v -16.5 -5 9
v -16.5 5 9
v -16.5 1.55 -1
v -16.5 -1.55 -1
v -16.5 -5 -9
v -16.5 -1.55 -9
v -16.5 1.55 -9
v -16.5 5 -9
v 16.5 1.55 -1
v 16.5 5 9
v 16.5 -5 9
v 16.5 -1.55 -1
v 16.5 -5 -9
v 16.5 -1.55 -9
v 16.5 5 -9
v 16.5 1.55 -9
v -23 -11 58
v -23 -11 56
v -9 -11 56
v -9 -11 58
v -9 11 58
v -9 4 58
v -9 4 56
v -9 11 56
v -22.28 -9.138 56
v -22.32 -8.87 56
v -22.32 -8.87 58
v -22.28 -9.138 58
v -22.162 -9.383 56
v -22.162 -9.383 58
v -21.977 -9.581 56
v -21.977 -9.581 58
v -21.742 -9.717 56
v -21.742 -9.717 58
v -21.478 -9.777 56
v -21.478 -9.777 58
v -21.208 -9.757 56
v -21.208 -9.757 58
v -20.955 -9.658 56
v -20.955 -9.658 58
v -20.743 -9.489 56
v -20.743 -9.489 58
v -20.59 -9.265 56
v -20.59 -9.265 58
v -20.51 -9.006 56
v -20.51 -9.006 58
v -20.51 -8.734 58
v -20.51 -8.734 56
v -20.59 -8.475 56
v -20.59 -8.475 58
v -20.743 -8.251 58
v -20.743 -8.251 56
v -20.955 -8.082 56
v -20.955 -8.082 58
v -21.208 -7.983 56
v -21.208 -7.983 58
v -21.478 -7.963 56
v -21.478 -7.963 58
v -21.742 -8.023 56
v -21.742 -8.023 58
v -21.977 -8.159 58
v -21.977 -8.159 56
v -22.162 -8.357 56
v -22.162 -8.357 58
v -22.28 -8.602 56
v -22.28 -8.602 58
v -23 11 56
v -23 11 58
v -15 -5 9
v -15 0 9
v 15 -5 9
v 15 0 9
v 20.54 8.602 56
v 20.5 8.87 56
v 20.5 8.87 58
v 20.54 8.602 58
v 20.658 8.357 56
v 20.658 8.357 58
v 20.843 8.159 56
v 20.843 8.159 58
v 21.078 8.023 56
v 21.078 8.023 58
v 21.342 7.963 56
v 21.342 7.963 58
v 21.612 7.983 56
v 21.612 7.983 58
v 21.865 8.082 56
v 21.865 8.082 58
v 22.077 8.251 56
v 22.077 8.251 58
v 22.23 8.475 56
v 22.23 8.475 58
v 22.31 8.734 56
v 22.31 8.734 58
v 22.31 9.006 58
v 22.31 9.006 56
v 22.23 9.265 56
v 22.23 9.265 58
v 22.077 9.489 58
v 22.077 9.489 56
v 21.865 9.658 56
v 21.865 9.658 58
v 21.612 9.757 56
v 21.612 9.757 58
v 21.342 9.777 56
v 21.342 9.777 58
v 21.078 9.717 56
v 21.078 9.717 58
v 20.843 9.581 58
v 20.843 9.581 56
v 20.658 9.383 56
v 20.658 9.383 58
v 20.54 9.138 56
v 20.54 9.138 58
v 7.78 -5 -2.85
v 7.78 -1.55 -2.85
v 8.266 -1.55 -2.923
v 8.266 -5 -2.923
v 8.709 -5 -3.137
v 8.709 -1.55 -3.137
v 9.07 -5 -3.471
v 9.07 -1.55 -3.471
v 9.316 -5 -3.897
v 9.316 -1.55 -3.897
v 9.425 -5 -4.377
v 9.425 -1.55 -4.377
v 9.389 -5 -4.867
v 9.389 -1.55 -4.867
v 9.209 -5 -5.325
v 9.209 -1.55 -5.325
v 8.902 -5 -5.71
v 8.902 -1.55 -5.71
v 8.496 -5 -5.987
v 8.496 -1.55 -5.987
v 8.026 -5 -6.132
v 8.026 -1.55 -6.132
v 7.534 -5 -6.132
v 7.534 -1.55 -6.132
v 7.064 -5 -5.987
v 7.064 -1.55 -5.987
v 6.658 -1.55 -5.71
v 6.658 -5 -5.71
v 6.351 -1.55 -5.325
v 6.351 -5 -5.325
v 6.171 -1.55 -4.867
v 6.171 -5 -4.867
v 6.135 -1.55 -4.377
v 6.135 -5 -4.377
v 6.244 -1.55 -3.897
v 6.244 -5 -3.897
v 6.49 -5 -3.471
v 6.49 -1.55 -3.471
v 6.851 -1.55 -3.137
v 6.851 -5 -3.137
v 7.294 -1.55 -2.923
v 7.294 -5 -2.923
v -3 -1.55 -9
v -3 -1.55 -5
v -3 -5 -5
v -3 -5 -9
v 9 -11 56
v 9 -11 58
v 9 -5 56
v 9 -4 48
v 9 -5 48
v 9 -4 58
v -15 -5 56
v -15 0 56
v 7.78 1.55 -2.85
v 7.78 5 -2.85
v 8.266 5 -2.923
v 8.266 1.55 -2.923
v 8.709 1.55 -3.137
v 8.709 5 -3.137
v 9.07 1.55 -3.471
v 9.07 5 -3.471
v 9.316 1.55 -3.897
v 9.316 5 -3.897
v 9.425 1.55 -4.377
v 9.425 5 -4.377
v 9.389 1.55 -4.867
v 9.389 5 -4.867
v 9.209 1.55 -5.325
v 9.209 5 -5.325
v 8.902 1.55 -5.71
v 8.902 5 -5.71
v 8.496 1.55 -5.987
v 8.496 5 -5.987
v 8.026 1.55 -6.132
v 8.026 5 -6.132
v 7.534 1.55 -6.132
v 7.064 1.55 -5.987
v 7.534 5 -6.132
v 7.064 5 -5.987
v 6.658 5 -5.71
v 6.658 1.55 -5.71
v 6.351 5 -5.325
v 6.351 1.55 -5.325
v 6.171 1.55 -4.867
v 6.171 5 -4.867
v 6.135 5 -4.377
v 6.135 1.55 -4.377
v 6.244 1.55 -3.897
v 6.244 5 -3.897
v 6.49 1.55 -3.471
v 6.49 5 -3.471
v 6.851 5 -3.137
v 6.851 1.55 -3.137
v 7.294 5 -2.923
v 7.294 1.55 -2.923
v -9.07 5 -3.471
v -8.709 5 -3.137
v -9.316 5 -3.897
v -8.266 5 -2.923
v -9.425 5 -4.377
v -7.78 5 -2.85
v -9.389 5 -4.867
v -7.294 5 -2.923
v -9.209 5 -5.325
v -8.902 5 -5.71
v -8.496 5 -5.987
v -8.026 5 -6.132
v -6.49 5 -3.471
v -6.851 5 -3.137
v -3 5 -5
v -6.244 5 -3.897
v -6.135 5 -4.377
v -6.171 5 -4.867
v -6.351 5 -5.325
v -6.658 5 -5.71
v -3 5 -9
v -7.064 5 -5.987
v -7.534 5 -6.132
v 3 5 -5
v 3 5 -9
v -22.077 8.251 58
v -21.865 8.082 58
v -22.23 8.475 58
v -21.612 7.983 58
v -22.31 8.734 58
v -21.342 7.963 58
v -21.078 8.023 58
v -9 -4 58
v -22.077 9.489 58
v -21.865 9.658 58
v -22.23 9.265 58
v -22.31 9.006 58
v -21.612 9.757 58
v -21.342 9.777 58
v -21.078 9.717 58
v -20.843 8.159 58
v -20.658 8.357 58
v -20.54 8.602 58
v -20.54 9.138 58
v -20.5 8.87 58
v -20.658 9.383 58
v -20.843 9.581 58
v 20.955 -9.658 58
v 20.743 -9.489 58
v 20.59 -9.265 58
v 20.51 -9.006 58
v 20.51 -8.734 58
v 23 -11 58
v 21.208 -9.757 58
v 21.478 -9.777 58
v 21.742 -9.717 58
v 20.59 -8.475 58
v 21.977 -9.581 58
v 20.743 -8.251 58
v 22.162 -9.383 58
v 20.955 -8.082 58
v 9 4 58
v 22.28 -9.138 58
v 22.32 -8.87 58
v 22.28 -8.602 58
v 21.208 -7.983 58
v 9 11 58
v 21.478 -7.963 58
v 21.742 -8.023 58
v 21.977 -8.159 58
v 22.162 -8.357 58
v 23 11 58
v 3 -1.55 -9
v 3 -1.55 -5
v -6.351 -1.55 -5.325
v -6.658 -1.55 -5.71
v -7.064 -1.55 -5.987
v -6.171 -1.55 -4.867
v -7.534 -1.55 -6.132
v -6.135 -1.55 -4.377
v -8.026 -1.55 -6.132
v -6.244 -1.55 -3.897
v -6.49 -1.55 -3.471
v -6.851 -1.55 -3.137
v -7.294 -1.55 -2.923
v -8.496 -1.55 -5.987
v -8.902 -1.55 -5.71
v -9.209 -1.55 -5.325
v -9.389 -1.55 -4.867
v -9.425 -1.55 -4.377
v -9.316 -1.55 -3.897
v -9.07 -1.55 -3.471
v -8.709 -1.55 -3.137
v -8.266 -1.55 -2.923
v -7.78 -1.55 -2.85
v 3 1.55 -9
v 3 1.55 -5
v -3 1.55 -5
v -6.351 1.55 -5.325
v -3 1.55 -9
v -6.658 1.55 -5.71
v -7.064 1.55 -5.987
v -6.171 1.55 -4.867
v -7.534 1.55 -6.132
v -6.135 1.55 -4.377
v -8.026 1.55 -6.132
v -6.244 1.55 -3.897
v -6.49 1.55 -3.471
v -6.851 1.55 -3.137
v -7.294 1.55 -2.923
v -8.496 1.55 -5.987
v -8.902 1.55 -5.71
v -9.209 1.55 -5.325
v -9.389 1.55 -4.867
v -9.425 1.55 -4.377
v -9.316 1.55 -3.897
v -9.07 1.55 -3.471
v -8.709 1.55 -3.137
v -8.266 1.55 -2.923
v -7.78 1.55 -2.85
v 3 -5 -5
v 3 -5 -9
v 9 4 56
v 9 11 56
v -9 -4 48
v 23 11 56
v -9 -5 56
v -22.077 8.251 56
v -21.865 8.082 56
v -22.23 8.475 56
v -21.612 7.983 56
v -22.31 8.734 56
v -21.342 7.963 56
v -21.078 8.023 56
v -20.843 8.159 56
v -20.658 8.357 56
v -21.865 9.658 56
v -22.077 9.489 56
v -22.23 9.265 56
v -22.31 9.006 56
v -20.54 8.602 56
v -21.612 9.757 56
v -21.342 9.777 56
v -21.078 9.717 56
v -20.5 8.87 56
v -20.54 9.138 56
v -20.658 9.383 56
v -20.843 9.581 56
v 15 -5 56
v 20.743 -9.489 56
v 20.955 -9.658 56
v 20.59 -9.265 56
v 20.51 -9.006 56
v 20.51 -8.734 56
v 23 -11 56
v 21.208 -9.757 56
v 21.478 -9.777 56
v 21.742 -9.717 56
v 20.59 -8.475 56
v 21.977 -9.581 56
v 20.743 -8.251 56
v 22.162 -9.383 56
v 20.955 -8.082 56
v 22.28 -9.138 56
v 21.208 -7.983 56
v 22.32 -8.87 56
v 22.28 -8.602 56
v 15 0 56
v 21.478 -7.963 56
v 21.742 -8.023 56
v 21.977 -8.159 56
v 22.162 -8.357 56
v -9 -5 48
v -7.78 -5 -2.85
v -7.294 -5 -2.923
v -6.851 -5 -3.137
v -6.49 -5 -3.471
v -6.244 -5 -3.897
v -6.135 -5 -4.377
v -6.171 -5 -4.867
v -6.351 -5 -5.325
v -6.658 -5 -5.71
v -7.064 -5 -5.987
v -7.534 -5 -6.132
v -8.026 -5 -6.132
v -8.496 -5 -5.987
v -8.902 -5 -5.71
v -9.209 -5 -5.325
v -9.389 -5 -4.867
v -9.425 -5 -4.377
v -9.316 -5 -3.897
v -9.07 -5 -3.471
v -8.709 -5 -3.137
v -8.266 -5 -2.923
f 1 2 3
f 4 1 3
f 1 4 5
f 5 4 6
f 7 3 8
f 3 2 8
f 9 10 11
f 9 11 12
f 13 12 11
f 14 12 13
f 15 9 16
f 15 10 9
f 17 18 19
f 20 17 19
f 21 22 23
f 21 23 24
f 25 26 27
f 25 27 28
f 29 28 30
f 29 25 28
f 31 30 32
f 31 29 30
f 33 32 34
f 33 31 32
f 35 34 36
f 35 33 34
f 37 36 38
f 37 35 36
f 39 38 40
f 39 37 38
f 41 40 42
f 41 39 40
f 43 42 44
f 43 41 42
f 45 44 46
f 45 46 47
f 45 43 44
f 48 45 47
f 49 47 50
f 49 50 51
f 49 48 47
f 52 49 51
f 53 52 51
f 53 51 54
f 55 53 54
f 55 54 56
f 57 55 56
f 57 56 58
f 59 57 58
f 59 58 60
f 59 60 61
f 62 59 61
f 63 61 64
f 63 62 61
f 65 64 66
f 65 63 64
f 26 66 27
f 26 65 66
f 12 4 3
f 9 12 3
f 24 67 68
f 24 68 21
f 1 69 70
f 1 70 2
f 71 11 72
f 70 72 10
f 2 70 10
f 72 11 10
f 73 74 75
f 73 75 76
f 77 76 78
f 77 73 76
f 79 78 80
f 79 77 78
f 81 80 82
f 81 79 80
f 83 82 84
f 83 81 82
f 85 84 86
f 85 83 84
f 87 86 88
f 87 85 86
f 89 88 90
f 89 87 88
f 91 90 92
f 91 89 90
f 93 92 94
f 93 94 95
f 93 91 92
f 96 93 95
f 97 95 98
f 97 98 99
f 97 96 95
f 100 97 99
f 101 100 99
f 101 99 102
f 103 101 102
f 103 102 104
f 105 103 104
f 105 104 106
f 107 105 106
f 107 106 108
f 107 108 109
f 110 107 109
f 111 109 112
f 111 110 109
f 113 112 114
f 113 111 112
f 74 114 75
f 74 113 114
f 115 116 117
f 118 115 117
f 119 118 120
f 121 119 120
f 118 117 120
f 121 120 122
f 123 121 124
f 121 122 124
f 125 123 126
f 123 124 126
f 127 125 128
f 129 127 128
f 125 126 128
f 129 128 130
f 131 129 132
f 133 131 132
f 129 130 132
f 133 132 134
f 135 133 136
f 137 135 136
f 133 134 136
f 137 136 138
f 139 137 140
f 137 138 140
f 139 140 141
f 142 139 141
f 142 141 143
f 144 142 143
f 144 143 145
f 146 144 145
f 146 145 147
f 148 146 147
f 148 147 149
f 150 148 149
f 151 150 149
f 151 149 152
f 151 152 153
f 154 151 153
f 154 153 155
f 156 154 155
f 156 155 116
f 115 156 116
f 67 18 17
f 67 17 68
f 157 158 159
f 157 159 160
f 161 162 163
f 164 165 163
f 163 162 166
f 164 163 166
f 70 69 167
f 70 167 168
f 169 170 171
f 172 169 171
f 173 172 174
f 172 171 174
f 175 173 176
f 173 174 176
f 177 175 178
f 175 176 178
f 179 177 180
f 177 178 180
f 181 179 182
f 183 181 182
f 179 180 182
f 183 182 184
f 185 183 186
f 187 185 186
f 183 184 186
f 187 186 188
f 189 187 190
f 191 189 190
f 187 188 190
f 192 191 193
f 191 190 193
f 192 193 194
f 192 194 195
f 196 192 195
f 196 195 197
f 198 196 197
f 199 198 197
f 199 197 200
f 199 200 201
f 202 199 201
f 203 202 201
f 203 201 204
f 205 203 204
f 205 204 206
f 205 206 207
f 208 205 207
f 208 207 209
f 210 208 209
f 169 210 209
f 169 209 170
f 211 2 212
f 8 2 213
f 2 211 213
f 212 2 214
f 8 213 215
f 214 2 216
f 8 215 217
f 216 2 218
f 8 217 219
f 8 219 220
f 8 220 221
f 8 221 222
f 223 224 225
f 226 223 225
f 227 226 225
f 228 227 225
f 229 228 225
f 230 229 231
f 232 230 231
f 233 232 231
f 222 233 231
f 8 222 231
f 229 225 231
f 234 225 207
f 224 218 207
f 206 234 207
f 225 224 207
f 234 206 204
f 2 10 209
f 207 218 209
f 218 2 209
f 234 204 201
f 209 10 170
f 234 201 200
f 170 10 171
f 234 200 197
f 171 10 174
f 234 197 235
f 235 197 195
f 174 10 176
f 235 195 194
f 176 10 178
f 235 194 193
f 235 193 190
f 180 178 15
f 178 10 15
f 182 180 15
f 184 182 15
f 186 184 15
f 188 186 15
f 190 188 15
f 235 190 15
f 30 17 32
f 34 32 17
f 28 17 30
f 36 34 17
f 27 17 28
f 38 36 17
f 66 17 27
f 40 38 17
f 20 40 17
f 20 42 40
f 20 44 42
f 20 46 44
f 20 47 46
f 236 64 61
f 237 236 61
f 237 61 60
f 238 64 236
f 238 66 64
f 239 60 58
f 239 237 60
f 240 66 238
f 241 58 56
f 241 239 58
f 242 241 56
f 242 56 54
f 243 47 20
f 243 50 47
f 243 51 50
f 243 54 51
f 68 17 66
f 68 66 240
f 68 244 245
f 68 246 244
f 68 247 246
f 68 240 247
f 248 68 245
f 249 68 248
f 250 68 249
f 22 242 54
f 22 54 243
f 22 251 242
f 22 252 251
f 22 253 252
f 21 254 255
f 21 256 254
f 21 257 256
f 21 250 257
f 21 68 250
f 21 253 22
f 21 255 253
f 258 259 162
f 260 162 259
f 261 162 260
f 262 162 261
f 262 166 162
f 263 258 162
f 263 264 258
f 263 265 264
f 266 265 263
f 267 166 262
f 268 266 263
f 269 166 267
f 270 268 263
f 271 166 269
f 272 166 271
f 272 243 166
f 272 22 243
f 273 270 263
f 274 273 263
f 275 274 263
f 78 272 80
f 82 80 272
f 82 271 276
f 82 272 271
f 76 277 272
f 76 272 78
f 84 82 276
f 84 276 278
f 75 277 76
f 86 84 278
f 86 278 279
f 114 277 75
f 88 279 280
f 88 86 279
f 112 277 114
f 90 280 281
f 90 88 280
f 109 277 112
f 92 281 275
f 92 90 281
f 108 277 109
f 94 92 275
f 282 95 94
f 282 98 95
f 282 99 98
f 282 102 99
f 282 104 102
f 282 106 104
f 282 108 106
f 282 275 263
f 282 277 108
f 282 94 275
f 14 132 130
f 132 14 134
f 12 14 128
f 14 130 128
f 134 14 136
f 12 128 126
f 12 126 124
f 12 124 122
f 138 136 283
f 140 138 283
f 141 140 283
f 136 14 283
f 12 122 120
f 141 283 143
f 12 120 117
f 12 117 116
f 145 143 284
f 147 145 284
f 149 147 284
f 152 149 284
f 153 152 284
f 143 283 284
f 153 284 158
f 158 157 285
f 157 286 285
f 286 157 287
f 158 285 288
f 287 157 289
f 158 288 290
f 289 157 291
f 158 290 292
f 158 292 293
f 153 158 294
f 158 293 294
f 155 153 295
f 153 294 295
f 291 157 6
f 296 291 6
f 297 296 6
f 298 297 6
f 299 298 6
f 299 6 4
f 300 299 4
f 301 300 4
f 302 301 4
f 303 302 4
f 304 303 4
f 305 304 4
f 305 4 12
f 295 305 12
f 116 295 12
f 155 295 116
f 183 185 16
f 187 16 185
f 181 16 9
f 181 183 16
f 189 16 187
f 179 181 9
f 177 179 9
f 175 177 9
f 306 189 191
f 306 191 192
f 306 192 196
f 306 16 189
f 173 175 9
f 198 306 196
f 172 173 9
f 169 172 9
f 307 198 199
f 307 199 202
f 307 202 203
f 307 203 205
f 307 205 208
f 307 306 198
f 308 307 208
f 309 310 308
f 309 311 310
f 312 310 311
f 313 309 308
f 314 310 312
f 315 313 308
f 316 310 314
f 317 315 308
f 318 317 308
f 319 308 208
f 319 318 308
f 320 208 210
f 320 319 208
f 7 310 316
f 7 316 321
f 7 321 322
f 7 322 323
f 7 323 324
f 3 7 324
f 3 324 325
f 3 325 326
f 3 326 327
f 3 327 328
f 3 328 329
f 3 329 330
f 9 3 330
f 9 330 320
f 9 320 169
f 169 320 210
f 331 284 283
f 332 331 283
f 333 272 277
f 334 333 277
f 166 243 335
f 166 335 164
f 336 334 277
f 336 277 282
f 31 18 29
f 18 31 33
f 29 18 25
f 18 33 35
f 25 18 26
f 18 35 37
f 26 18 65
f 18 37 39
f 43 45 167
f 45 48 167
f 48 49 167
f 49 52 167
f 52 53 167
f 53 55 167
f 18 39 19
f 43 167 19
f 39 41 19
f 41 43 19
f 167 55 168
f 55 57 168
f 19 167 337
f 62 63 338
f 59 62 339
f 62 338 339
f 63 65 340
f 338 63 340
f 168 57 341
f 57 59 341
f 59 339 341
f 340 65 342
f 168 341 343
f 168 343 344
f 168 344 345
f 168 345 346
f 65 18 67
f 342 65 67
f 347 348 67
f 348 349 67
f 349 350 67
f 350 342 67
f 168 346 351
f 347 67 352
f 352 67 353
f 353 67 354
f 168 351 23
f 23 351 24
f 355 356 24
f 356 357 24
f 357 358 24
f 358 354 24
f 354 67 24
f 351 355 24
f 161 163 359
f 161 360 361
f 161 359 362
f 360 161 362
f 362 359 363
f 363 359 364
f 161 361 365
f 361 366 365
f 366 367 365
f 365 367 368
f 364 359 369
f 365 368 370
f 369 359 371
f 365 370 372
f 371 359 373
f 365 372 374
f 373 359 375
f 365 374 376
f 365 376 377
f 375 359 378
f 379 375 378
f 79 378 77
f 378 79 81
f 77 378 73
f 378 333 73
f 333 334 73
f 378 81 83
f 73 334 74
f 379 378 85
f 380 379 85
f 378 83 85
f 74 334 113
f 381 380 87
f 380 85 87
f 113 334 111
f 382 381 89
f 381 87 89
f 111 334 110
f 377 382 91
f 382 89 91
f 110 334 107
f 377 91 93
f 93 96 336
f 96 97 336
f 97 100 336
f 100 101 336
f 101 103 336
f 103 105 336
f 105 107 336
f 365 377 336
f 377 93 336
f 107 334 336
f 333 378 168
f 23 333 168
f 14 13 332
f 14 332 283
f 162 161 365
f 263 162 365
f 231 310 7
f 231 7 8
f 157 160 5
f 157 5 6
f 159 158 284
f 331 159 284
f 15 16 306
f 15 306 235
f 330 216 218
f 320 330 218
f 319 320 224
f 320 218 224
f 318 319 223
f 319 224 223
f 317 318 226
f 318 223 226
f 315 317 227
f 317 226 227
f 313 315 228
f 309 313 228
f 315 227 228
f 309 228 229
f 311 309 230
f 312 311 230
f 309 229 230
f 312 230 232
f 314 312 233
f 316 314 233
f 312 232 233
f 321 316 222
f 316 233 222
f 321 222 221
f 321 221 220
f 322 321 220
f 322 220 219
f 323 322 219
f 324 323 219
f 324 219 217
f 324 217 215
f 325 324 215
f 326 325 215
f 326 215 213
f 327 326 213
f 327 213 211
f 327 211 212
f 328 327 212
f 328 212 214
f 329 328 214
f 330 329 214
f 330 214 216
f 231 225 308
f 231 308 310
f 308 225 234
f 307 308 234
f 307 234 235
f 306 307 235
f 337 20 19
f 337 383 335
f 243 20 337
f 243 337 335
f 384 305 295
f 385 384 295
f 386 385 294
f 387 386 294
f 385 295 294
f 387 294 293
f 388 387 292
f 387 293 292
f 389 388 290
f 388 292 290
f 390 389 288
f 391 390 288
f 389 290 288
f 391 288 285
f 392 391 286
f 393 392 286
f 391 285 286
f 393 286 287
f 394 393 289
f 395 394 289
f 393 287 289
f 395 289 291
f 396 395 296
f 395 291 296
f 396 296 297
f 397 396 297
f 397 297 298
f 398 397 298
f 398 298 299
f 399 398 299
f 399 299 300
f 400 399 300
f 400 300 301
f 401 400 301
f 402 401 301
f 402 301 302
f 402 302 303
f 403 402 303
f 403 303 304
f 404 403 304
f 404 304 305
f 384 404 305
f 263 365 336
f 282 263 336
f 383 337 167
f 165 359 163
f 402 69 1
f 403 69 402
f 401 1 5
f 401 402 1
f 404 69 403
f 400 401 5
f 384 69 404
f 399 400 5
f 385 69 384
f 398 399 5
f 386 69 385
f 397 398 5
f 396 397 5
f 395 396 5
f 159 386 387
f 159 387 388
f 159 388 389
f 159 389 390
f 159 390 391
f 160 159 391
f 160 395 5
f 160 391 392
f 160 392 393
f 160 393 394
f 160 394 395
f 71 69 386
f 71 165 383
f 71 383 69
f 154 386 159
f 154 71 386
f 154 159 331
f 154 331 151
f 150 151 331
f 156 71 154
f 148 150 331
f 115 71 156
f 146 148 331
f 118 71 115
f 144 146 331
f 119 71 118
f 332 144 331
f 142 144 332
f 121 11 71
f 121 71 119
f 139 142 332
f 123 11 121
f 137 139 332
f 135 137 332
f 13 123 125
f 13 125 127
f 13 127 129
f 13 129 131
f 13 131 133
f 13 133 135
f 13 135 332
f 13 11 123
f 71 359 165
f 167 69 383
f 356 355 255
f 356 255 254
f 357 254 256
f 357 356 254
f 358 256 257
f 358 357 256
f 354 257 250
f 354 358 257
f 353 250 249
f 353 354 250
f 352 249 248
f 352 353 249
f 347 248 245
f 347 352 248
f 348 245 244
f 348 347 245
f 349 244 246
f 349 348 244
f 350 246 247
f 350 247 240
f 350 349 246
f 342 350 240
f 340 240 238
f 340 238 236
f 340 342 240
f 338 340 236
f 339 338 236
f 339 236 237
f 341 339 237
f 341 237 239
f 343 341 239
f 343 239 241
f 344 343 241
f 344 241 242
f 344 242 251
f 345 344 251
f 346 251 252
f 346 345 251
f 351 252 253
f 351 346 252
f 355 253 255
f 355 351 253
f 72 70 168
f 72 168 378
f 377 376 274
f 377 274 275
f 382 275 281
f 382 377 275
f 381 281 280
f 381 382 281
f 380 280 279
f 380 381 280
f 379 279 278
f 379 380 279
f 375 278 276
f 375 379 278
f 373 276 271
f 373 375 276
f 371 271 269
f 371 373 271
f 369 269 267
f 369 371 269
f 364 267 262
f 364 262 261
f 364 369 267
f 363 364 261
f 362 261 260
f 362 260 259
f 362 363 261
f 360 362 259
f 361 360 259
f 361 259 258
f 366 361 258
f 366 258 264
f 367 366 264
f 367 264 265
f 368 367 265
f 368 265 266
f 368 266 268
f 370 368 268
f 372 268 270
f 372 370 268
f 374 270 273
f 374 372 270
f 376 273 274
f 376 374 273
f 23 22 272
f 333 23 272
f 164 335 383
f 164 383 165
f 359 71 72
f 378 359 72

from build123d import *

# Parameters (mm, degrees)
SKETCH_1_W          = 18
SKETCH_1_H          = 10
EXTRUDE_1_DEPTH     = 16.5
SKETCH_2_W          = 8
SKETCH_2_H          = 3.1
CUT_EXTRUDE_1_DEPTH = 40
SKETCH_3_R          = 1.65
CUT_EXTRUDE_2_DEPTH = 20
SKETCH_5_W          = 6
SKETCH_5_H          = 8
CUT_EXTRUDE_3_DEPTH = 20
SKETCH_6_W          = 30
SKETCH_6_H          = 5
EXTRUDE_2_DEPTH     = 47
SKETCH_7_W          = 46
SKETCH_7_H          = 22
SKETCH_7_R          = 0.91
EXTRUDE_3_DEPTH     = 2
SKETCH_8_W          = 18
SKETCH_8_H          = 7
CUT_EXTRUDE_4_DEPTH = 10


with BuildPart() as part:
    # 草图1 → 凸台-拉伸1 (new, symmetric)
    with BuildSketch(Plane(origin=(0, 0, 0), x_dir=(0, 0, -1), z_dir=(1, 0, 0))):
        Rectangle(SKETCH_1_W, SKETCH_1_H)
    extrude(amount=EXTRUDE_1_DEPTH, both=True)

    # 草图2 → 切除-拉伸1 (cut)
    with BuildSketch(Plane.ZY.offset(16.5)):
        with Locations((-5, 0)):
            Rectangle(SKETCH_2_W, SKETCH_2_H)
    extrude(amount=-CUT_EXTRUDE_1_DEPTH, mode=Mode.SUBTRACT)

    # 草图3 → 切除-拉伸2 (cut)
    with BuildSketch(Plane(origin=(0, 5, 0), x_dir=(1, 0, 0), z_dir=(0, 1, 0))):
        with Locations(Location((-7.78, 4.5, 0), (0, 0, 270))):
            Circle(SKETCH_3_R)
        with Locations(Location((7.78, 4.5, 0), (0, 0, 270))):
            Circle(SKETCH_3_R)
    extrude(amount=-CUT_EXTRUDE_2_DEPTH, mode=Mode.SUBTRACT)

    # 草图5 → 切除-拉伸3 (cut)
    with BuildSketch(Plane(origin=(0, 5, 0), x_dir=(1, 0, 0), z_dir=(0, 1, 0))):
        with Locations((0, 9)):
            Rectangle(SKETCH_5_W, SKETCH_5_H)
    extrude(amount=-CUT_EXTRUDE_3_DEPTH, mode=Mode.SUBTRACT)

    # 草图6 → 凸台-拉伸2 (add)
    with BuildSketch(Plane.XY.offset(9)):
        with Locations((0, -2.5)):
            Rectangle(SKETCH_6_W, SKETCH_6_H)
    extrude(amount=EXTRUDE_2_DEPTH)

    # 草图7 → 凸台-拉伸3 (add)
    with BuildSketch(Plane.XY.offset(56)):
        Rectangle(SKETCH_7_W, SKETCH_7_H)
        with Locations((-21.41, 8.87)):
            Circle(SKETCH_7_R, mode=Mode.SUBTRACT)
        with Locations(Location((21.41, 8.87, 0), (0, 0, 180))):
            Circle(SKETCH_7_R, mode=Mode.SUBTRACT)
        with Locations((21.41, -8.87)):
            Circle(SKETCH_7_R, mode=Mode.SUBTRACT)
        with Locations(Location((-21.41, -8.87, 0), (0, 0, 180))):
            Circle(SKETCH_7_R, mode=Mode.SUBTRACT)
    extrude(amount=EXTRUDE_3_DEPTH)

    # 草图8 → 切除-拉伸4 (cut)
    with BuildSketch(Plane.XY.offset(58)):
        with Locations((0, 7.5)):
            Rectangle(SKETCH_8_W, SKETCH_8_H)
        with Locations((0, -7.5)):
            Rectangle(SKETCH_8_W, SKETCH_8_H)
    extrude(amount=-CUT_EXTRUDE_4_DEPTH, mode=Mode.SUBTRACT)


solid = part.part
